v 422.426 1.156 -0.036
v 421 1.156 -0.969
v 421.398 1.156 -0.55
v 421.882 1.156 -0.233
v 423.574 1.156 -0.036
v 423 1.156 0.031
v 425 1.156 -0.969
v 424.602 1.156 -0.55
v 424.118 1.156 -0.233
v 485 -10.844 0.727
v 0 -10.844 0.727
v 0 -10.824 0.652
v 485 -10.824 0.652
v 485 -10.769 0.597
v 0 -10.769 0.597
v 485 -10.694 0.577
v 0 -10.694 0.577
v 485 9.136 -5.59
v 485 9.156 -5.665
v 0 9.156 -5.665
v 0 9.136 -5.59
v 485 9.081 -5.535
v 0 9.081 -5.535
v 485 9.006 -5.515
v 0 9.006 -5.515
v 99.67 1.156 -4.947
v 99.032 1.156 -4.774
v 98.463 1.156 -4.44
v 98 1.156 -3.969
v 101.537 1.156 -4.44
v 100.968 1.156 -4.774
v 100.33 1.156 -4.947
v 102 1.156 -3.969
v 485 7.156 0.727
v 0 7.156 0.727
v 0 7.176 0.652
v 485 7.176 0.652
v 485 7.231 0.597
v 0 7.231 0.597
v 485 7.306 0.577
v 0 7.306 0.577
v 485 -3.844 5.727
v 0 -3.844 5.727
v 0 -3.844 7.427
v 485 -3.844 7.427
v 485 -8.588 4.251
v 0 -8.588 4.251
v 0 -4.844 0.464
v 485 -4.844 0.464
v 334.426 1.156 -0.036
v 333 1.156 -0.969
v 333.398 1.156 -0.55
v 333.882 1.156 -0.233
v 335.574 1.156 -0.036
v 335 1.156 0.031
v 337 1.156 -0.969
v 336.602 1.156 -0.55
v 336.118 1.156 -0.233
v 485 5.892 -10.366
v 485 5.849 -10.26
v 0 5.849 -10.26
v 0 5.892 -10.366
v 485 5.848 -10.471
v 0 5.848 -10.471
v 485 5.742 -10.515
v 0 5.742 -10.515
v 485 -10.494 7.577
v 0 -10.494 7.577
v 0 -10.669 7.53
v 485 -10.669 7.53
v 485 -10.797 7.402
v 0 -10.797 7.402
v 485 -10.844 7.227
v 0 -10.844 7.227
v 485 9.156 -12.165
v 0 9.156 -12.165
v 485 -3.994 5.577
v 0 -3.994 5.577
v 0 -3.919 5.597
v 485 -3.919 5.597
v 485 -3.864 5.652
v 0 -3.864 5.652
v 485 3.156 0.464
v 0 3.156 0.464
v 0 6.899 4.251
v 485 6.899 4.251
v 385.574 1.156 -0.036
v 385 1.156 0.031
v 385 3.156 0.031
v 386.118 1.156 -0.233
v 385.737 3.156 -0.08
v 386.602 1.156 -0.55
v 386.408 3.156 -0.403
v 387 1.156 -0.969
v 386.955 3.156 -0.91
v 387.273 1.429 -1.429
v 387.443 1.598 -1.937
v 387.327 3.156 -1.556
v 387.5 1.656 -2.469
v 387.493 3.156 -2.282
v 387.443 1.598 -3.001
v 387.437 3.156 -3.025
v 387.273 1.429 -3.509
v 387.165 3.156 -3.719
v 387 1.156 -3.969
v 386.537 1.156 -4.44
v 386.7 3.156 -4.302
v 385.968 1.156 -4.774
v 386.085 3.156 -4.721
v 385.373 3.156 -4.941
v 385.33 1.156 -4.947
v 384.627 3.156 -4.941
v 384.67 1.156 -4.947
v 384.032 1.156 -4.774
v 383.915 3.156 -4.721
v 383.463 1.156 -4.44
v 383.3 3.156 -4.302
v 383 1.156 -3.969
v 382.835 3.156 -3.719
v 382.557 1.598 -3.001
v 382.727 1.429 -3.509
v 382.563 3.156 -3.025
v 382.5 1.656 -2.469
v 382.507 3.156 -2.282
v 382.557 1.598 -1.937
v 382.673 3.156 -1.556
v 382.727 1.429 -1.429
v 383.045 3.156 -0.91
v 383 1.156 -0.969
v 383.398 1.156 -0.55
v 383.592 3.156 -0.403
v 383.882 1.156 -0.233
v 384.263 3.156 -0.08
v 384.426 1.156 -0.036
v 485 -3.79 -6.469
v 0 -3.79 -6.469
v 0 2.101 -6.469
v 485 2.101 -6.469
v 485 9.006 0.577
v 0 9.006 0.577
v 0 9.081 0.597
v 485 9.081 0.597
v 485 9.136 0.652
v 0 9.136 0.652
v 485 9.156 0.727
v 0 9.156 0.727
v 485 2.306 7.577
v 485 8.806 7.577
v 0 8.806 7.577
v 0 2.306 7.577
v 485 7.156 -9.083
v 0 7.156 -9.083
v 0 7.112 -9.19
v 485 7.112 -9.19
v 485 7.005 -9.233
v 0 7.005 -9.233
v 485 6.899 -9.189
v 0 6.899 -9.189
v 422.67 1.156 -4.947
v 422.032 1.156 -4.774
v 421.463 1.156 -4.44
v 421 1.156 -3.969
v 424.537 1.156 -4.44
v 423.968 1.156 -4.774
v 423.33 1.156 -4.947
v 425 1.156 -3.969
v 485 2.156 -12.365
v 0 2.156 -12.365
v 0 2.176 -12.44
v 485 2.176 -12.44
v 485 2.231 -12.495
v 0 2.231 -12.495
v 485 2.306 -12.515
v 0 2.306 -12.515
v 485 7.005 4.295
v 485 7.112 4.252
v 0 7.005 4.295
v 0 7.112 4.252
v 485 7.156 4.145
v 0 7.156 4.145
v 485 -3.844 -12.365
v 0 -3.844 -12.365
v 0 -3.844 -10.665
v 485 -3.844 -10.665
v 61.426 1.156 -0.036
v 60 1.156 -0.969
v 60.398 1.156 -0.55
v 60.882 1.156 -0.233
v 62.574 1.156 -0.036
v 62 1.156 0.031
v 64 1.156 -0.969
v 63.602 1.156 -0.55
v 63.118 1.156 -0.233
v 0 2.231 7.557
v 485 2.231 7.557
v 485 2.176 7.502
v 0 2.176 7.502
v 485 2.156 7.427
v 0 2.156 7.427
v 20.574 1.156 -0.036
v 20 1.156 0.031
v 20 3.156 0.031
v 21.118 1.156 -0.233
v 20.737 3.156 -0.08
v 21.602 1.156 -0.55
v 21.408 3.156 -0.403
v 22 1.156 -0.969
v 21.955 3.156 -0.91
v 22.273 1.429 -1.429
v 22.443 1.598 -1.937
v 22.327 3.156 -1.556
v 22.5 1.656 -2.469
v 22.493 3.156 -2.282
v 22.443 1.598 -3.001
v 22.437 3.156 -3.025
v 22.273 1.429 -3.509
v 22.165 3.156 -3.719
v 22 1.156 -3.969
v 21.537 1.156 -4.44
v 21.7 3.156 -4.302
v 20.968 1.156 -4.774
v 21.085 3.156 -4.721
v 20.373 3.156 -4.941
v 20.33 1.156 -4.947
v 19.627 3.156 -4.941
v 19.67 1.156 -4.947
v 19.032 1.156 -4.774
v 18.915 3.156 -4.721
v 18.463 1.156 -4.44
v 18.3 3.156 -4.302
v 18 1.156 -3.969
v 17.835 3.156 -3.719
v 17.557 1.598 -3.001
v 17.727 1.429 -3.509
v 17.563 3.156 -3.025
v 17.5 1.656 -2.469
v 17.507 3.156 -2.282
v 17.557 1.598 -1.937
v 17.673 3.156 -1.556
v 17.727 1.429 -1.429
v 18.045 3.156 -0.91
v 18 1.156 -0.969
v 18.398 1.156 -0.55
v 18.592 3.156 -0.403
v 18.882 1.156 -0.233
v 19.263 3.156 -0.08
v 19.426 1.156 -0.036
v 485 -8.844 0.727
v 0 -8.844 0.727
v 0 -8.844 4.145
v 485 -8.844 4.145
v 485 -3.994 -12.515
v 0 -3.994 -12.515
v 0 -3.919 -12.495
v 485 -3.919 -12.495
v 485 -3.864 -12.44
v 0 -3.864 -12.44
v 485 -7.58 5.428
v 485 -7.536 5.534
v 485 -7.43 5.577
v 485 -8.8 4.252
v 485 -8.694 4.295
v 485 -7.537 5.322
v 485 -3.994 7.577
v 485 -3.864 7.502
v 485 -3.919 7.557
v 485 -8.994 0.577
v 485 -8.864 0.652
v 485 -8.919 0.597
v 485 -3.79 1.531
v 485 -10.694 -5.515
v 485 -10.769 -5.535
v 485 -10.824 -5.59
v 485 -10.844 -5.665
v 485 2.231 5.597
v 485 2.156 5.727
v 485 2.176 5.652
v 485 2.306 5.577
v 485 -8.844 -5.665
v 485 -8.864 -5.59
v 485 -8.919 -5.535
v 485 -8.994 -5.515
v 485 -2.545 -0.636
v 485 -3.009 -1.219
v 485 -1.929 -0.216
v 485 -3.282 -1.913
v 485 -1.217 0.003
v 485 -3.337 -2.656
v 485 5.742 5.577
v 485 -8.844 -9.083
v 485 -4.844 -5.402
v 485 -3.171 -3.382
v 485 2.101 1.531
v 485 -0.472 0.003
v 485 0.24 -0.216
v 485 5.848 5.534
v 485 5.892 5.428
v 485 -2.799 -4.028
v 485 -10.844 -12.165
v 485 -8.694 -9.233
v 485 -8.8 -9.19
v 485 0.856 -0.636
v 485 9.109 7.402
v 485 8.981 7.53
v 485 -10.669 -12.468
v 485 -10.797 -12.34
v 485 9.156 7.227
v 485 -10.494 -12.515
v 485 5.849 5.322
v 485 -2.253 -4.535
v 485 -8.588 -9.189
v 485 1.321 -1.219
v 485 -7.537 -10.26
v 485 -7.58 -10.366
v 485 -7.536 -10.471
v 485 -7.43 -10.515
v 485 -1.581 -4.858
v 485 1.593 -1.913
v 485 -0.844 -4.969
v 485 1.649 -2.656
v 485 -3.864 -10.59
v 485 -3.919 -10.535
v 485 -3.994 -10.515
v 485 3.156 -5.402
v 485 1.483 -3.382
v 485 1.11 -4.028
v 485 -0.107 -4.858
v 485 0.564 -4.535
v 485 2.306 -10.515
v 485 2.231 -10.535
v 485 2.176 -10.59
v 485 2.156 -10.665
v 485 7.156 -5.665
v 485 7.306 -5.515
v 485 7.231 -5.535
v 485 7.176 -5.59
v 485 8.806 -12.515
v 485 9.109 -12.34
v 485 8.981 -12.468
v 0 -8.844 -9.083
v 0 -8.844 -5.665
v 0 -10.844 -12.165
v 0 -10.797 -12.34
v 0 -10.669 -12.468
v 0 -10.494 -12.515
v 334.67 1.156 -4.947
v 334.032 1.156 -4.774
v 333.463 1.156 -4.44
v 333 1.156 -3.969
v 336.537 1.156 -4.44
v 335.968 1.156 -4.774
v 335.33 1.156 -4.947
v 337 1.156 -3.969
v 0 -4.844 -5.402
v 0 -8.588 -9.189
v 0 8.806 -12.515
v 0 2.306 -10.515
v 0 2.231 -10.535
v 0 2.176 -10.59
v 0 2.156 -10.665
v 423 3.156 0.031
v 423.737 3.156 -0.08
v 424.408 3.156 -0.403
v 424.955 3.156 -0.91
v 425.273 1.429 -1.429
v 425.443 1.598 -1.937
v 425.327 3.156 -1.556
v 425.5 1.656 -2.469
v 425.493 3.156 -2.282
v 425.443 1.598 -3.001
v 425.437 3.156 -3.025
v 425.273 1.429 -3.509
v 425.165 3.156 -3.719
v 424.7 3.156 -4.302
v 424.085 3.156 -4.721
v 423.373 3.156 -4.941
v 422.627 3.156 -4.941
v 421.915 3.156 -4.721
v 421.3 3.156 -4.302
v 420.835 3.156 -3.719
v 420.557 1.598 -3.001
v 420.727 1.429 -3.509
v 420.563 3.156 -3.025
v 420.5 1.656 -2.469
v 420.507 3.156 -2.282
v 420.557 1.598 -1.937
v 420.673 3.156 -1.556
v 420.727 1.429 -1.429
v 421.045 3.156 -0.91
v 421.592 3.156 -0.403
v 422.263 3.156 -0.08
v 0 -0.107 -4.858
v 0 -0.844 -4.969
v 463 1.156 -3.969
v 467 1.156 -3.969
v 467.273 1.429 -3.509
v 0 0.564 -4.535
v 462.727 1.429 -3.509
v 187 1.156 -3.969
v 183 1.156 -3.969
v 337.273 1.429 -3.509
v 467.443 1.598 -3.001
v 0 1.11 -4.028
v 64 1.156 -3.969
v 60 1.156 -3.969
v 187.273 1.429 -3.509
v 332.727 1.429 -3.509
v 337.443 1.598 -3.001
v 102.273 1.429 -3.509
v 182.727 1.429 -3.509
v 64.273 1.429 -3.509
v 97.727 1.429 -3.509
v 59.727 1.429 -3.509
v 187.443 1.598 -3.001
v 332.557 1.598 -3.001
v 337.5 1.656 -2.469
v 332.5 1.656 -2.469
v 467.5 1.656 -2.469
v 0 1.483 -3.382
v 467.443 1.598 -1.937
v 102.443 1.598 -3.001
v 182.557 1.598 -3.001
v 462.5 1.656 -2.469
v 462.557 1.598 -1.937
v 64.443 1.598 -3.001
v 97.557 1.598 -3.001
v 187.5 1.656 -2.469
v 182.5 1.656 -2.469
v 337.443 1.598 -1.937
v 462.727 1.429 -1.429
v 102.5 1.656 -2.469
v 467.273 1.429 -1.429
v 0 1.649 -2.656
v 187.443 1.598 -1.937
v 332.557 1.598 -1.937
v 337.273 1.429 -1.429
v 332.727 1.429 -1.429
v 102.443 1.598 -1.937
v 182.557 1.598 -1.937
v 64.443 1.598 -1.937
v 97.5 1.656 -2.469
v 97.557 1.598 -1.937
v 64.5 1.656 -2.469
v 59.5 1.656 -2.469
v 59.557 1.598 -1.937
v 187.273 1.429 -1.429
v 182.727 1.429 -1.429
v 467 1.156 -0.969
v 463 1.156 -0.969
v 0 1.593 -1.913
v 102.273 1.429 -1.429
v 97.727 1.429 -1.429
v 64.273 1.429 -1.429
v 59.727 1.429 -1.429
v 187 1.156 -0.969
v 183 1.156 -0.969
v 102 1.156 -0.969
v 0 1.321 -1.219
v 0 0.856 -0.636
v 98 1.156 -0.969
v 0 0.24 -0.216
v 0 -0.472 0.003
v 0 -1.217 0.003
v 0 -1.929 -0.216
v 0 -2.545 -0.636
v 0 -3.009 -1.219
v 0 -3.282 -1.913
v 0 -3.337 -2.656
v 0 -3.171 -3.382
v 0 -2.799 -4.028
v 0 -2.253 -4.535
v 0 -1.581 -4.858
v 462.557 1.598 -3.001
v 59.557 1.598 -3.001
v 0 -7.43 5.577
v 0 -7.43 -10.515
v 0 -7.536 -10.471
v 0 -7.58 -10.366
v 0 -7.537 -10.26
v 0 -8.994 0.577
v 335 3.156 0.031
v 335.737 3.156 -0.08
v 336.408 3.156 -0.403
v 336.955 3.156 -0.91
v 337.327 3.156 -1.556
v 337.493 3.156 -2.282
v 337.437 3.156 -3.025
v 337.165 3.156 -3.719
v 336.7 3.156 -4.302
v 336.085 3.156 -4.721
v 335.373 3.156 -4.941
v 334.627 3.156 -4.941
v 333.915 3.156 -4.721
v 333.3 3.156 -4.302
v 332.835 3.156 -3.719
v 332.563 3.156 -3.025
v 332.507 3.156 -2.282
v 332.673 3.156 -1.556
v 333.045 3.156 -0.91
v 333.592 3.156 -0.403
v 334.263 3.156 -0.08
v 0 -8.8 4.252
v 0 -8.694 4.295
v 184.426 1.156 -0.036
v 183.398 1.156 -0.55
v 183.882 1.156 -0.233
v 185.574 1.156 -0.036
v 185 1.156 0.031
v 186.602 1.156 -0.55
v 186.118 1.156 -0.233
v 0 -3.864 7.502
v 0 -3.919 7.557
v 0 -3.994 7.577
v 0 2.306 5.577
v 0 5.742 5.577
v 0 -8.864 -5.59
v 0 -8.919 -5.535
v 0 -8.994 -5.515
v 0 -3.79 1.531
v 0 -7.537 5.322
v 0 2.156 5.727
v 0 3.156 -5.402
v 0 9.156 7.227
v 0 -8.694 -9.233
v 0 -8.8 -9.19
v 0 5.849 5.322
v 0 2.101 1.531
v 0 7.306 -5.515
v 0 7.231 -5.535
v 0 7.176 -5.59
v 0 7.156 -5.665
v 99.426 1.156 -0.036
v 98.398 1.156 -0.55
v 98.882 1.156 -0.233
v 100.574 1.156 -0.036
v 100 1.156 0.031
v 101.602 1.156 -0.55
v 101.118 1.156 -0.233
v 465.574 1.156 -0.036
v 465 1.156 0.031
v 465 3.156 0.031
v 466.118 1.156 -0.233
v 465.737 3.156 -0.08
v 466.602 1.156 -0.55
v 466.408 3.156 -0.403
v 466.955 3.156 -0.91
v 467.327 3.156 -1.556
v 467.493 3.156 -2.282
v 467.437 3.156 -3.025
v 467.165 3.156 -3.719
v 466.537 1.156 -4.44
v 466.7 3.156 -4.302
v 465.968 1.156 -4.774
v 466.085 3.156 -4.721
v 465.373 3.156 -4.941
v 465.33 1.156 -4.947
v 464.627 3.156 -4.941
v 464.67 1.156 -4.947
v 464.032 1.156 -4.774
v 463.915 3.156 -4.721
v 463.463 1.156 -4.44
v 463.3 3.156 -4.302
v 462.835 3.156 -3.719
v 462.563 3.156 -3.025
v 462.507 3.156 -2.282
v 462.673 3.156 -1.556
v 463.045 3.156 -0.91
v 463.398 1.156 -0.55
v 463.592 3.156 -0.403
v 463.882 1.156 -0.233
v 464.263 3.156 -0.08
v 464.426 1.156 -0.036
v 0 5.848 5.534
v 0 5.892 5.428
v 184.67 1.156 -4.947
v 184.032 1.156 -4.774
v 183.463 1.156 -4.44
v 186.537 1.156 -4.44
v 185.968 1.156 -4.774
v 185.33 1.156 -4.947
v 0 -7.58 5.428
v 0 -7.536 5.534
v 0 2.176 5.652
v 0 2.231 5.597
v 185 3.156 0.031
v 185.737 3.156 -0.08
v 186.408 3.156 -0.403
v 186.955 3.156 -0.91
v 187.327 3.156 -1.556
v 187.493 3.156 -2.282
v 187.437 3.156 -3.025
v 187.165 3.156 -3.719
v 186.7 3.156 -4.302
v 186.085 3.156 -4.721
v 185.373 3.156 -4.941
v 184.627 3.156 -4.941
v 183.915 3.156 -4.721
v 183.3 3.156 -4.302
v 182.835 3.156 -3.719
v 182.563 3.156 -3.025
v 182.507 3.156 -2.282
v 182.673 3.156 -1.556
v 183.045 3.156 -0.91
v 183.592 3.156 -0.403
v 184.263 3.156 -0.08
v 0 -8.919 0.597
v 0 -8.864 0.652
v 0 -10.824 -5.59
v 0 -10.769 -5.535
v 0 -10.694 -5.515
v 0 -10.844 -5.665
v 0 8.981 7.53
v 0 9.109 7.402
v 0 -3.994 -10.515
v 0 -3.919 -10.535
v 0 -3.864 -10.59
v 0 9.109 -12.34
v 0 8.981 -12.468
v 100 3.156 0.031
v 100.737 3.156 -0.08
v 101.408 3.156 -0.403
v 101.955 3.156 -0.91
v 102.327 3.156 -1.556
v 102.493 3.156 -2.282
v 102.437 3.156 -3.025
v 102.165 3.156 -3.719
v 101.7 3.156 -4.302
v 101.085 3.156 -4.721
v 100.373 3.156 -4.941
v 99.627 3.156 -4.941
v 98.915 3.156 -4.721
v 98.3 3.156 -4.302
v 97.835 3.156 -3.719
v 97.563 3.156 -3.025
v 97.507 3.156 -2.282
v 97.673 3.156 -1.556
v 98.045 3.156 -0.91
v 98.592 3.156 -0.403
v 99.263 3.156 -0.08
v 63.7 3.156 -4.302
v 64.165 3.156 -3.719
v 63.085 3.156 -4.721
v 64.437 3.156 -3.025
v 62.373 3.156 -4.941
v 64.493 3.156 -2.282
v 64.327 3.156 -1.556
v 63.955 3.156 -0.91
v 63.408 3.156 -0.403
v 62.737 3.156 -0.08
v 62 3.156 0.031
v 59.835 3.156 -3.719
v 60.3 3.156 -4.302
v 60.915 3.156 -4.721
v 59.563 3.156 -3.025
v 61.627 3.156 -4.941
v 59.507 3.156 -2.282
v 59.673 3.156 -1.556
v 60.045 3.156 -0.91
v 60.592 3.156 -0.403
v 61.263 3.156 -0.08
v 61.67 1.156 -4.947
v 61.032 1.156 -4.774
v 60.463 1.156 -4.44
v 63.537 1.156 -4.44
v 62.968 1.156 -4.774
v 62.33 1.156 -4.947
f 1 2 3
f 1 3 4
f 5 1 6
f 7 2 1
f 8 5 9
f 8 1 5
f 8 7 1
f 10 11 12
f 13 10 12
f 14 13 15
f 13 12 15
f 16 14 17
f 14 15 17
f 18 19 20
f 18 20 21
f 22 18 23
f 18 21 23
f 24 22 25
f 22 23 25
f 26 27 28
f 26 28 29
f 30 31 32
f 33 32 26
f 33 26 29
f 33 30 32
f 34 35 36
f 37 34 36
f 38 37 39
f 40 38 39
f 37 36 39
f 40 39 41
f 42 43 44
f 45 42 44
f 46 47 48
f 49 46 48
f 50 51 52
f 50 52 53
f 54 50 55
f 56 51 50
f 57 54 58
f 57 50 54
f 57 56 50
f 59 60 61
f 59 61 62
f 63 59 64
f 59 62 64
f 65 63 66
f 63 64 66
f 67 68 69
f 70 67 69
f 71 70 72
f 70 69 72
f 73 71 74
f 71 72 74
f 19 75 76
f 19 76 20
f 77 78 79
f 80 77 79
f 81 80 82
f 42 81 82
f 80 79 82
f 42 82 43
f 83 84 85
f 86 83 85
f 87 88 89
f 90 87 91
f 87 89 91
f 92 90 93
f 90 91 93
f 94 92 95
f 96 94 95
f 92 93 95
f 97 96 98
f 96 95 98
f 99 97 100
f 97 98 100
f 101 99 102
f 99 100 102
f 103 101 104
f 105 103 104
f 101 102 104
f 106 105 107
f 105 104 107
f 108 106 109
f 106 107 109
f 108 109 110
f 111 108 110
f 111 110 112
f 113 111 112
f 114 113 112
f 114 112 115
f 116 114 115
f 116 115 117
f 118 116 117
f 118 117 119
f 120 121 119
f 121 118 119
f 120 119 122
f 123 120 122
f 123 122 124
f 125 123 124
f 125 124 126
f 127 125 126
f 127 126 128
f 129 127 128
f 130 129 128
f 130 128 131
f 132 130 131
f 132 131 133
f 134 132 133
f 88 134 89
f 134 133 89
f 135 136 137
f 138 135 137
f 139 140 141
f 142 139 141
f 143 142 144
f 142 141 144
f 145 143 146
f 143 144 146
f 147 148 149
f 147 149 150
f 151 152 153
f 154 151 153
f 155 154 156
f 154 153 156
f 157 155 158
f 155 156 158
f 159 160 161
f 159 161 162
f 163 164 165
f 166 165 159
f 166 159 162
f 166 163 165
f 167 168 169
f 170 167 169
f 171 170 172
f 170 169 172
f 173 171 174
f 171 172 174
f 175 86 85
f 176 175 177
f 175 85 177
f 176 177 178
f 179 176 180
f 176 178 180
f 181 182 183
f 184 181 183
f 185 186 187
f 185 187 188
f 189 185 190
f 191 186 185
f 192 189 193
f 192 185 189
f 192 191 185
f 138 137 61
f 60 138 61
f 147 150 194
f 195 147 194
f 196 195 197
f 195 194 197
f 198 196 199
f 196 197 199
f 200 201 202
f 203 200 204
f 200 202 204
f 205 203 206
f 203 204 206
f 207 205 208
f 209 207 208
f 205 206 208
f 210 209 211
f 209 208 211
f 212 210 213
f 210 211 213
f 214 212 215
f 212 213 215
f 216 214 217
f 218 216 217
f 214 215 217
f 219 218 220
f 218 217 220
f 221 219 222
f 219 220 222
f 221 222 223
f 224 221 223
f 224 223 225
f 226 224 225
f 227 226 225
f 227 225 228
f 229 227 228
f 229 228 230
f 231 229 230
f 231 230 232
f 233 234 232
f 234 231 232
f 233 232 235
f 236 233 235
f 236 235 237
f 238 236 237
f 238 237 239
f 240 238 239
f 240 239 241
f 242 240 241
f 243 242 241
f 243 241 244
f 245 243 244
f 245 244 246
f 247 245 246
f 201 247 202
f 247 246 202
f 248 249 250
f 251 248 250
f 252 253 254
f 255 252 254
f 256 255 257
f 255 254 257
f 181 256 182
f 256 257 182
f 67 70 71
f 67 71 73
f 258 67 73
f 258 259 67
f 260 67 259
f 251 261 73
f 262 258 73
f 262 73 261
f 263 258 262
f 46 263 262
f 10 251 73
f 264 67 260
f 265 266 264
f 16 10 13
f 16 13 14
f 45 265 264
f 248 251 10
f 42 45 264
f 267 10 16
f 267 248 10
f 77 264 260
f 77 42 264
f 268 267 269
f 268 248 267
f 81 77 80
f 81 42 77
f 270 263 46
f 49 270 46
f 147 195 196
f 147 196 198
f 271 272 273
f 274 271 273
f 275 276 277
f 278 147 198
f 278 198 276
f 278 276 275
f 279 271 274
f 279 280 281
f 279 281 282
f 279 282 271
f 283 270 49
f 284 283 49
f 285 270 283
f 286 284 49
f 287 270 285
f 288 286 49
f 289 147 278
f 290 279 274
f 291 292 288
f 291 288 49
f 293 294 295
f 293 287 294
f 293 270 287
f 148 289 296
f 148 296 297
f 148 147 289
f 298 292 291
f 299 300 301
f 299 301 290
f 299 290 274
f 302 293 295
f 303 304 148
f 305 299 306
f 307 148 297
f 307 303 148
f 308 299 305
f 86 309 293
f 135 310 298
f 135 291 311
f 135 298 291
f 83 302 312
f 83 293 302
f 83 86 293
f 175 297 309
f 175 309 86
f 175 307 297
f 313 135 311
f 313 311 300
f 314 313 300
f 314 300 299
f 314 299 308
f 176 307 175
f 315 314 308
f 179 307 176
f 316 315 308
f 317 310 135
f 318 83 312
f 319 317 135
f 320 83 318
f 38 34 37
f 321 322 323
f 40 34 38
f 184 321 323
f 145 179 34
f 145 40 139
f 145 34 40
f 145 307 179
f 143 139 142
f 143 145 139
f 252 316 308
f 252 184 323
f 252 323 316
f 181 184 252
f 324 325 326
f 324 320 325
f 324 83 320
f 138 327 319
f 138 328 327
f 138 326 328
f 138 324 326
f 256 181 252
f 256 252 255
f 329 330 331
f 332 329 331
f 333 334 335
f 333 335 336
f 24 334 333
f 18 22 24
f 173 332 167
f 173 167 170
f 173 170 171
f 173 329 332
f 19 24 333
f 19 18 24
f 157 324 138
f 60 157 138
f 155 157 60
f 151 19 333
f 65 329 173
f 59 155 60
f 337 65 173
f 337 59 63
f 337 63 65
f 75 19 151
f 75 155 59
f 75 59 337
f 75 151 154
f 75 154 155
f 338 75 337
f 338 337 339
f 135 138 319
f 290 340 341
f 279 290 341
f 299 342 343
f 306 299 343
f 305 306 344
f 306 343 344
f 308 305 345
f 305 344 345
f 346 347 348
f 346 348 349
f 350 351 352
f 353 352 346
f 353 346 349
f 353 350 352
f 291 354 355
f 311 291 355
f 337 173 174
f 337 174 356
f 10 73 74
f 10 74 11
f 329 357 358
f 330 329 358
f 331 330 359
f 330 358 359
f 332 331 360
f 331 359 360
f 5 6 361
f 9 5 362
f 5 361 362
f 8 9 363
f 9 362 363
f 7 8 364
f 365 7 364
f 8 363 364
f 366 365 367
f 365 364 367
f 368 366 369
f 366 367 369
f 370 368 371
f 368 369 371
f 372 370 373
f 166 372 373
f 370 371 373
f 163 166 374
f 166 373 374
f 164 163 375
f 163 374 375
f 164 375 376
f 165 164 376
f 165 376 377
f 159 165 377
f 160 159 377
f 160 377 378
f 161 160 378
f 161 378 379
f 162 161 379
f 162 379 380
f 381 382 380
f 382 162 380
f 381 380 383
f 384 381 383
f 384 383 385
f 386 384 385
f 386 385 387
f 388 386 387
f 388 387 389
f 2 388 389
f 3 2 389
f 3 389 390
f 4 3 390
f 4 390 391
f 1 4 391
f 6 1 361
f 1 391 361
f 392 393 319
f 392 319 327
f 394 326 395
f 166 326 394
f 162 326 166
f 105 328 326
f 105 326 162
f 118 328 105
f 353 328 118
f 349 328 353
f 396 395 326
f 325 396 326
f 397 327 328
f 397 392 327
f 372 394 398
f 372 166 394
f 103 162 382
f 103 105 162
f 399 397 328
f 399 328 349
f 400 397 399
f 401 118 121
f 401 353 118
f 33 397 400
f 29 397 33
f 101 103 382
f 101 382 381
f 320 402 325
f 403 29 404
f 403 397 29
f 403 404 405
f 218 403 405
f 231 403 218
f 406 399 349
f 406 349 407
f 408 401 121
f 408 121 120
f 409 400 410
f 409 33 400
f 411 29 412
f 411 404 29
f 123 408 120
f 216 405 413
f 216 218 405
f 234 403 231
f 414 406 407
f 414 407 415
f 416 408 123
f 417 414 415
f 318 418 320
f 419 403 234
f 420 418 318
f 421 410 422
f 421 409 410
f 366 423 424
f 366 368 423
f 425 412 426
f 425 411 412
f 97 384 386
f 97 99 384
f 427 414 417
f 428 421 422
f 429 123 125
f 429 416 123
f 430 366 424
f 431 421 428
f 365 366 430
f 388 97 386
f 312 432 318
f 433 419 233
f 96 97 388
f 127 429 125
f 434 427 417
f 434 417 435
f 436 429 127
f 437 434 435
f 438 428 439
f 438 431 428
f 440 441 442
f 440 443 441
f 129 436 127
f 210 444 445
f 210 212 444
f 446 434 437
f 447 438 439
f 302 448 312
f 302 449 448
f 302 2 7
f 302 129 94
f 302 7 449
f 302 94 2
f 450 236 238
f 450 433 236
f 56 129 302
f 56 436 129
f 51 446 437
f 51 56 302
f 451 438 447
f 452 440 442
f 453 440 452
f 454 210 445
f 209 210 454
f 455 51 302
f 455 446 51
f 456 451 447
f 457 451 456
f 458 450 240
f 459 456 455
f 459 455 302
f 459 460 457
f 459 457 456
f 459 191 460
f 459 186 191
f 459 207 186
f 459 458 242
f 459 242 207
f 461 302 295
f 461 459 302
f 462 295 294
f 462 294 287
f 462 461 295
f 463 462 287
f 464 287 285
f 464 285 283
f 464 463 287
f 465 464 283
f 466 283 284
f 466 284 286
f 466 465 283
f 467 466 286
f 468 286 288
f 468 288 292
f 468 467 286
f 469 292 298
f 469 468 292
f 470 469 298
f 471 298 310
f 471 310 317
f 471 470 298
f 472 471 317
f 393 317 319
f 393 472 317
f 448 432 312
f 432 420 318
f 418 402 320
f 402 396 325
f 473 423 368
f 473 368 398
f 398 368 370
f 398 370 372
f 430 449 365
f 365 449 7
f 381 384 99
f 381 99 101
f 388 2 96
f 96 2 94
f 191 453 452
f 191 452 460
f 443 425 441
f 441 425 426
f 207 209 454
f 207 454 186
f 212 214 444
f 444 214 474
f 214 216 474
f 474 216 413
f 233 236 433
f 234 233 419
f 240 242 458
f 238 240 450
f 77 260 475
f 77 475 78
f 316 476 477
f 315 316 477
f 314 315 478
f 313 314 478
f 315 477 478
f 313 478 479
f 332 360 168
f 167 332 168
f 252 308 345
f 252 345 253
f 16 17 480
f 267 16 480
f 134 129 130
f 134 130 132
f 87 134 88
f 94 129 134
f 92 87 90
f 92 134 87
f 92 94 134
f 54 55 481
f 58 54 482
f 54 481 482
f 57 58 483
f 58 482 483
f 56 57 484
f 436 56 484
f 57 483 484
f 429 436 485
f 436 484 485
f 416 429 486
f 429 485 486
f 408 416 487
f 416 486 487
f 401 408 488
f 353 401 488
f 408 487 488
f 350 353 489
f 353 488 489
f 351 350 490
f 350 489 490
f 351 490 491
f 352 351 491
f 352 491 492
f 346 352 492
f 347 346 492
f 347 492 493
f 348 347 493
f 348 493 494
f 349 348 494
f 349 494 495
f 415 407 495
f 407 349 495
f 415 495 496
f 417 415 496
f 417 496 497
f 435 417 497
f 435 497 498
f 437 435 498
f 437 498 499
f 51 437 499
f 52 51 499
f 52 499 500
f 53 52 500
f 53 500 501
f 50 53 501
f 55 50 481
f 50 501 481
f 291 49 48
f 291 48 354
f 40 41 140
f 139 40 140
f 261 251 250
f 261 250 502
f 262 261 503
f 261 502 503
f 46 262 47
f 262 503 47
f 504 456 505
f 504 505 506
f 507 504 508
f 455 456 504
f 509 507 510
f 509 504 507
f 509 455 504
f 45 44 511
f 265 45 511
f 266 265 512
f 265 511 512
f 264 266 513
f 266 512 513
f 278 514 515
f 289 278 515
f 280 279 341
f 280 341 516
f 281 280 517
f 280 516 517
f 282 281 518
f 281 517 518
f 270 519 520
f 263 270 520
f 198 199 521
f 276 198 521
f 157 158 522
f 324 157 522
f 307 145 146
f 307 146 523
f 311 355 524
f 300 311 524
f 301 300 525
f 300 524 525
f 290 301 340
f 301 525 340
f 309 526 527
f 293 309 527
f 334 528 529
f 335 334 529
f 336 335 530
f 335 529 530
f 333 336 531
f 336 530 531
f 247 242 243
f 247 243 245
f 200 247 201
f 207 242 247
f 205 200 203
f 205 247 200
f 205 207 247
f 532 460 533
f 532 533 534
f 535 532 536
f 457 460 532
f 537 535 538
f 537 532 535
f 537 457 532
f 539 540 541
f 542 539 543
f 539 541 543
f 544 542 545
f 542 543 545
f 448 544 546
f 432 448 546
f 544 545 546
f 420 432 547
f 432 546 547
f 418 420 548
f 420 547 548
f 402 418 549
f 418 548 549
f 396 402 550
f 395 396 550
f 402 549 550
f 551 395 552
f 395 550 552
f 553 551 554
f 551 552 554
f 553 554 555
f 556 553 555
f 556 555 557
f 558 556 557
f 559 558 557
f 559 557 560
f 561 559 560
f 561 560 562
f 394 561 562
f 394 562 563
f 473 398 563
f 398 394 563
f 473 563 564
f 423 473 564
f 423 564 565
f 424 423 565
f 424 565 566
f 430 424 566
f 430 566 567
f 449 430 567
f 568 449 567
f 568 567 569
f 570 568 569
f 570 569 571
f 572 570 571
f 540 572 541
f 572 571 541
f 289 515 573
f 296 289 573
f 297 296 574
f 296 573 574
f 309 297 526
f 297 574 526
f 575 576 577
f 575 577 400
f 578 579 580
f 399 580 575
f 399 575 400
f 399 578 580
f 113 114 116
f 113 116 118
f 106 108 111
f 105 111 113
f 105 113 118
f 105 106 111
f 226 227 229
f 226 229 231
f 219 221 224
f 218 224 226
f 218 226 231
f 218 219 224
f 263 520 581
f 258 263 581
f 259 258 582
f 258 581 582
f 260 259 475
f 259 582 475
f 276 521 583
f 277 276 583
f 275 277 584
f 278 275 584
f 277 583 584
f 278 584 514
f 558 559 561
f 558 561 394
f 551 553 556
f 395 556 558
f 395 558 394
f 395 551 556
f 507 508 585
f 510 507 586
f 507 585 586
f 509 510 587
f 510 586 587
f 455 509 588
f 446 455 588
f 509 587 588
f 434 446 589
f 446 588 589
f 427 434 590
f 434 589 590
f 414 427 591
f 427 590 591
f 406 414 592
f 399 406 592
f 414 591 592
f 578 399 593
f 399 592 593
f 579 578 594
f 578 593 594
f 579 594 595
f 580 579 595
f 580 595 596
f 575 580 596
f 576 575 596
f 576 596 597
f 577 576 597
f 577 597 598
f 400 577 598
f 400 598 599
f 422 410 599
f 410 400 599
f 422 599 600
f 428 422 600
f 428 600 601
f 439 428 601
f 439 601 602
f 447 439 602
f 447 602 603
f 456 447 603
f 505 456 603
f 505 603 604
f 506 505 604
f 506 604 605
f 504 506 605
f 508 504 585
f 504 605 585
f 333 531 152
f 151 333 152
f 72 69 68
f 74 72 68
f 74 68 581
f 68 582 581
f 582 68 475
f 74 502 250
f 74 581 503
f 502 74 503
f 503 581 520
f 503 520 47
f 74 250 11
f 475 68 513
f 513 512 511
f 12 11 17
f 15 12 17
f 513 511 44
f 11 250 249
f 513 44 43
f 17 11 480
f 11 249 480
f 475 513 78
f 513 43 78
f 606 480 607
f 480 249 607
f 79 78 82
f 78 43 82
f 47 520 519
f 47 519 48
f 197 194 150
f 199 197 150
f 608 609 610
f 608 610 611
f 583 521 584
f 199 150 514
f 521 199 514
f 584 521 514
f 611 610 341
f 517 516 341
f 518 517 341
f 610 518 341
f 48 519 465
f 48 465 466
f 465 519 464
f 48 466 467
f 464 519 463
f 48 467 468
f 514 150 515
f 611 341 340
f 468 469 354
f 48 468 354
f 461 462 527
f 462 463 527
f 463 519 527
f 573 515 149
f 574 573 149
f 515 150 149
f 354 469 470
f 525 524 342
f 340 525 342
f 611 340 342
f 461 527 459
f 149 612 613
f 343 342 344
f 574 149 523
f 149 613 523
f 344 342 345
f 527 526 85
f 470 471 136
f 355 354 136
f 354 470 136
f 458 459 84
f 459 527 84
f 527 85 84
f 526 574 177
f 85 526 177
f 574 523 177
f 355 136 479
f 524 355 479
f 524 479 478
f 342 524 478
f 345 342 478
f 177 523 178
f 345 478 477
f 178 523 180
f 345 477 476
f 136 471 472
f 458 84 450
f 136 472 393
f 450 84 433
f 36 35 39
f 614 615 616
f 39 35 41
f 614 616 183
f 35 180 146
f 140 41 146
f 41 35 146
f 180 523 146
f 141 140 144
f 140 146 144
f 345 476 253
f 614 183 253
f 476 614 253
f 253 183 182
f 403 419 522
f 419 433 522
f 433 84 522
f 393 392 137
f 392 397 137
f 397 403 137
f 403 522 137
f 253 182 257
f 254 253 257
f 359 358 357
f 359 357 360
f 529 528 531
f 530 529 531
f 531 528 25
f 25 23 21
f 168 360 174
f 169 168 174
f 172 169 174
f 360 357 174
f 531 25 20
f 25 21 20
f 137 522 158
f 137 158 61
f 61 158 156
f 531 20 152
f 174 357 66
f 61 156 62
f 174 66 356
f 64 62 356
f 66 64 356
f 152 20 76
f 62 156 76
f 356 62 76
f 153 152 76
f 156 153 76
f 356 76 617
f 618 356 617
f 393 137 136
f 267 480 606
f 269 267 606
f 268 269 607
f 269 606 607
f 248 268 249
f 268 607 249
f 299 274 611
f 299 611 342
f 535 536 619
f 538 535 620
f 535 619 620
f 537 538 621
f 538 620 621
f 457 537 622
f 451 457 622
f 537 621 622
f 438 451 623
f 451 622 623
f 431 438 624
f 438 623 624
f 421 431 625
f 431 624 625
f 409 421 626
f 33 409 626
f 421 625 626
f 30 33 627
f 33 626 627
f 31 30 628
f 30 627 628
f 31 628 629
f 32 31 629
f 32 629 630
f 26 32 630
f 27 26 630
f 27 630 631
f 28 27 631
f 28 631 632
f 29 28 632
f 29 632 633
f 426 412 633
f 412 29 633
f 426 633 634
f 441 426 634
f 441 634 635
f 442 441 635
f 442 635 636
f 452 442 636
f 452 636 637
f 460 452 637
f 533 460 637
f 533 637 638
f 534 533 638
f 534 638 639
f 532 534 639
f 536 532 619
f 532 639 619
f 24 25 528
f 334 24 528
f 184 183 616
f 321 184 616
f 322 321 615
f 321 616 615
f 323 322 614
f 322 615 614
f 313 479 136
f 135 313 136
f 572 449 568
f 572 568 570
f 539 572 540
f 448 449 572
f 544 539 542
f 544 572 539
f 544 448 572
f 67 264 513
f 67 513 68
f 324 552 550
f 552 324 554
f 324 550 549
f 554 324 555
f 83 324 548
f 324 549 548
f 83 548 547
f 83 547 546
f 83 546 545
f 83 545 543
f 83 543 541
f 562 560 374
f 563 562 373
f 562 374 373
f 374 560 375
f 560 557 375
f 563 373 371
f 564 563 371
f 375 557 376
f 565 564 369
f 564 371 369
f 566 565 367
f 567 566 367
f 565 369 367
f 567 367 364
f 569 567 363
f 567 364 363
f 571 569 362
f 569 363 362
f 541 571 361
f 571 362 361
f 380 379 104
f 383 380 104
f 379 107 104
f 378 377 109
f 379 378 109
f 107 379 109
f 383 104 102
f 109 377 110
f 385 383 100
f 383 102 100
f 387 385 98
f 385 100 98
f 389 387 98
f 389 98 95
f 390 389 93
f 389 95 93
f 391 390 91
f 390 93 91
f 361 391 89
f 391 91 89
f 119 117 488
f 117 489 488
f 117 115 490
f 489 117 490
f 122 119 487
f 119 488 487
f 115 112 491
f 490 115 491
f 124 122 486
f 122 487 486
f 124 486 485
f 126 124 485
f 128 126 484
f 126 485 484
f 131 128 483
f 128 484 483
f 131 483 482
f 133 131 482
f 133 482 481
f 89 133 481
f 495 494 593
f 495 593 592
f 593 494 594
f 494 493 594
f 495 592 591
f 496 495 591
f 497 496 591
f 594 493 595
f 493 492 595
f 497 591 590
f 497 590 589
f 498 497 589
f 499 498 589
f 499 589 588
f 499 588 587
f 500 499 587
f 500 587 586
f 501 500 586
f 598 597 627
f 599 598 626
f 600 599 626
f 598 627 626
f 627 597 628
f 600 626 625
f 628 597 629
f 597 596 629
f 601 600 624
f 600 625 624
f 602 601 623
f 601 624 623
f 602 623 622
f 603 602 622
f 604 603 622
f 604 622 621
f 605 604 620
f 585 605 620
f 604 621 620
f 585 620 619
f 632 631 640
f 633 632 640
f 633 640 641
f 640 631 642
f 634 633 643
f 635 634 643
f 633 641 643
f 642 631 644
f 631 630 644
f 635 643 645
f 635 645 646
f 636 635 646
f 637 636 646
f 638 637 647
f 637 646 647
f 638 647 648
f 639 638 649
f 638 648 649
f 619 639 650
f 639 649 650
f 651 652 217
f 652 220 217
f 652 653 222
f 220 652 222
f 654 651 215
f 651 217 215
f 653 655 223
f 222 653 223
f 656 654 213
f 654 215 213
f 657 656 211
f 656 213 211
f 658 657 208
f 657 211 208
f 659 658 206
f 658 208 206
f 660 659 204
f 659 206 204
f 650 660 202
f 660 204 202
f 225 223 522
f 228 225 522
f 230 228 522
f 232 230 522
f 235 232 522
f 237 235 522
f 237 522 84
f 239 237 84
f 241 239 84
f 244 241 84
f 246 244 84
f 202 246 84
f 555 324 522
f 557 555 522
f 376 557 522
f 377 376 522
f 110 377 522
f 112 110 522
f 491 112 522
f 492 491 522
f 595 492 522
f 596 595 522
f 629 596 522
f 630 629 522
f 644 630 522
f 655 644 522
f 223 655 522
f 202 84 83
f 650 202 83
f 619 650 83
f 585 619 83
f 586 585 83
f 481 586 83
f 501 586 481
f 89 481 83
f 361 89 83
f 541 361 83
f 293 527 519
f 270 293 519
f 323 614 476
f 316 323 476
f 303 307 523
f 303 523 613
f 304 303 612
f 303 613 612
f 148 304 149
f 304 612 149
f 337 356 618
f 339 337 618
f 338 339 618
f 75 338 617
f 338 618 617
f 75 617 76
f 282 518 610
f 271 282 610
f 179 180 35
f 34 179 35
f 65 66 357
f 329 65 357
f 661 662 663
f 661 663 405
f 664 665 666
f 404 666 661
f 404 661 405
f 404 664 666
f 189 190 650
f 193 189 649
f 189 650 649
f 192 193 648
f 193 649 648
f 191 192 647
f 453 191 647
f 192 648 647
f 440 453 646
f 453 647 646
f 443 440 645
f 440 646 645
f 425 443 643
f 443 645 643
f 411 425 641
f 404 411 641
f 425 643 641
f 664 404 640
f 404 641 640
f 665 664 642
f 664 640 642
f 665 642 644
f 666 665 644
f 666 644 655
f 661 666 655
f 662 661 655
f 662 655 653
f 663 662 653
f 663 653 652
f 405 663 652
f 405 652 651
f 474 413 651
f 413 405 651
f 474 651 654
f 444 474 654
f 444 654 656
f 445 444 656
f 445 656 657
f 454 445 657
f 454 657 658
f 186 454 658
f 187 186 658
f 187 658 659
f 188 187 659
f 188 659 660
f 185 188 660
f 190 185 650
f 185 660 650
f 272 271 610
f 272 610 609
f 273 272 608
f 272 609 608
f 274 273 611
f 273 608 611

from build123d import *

# Parameters (mm, degrees)
SKETCH1_R           = 2.5
BOSS_EXTRUDE1_DEPTH = 485
SKETCH2_R           = 2.5
CUT_EXTRUDE1_DEPTH  = 2


with BuildPart() as part:
    # Sketch1 → Boss-Extrude1 (new body)
    with BuildSketch(Plane(origin=(0, 0, 0), x_dir=(0, 0, -1), z_dir=(1, 0, 0))):
        with BuildLine():
            Line((-7.427382464, 2.155691805), (-5.727382464, 2.155691805))
            ThreePointArc((-5.727382464, 2.155691805), (-5.621316447, 2.199625788), (-5.577382464, 2.305691805))
            Line((-5.577382464, 2.305691805), (-5.577382464, 5.741876319))
            ThreePointArc((-5.577382464, 5.741876319), (-5.485183419, 5.880292537), (-5.321928469, 5.848550846))
            Line((-5.321928469, 5.848550846), (-1.531086168, 2.101082027))
            Line((-1.531086168, 2.101082027), (-1.531086168, -3.789698417))
            Line((-1.531086168, -3.789698417), (-5.321928469, -7.537167236))
            ThreePointArc((-5.321928469, -7.537167236), (-5.485183419, -7.568908927), (-5.577382464, -7.430492708))
            Line((-5.577382464, -7.430492708), (-5.577382464, -3.994308195))
            ThreePointArc((-5.577382464, -3.994308195), (-5.621316447, -3.888242178), (-5.727382464, -3.844308195))
            Line((-5.727382464, -3.844308195), (-7.427382464, -3.844308195))
            ThreePointArc((-7.427382464, -3.844308195), (-7.533448481, -3.888242178), (-7.577382464, -3.994308195))
            Line((-7.577382464, -3.994308195), (-7.577382464, -10.494308195))
            ThreePointArc((-7.577382464, -10.494308195), (-7.474869837, -10.741795568), (-7.227382464, -10.844308195))
            Line((-7.227382464, -10.844308195), (-0.727382464, -10.844308195))
            ThreePointArc((-0.727382464, -10.844308195), (-0.621316447, -10.800374212), (-0.577382464, -10.694308195))
            Line((-0.577382464, -10.694308195), (-0.577382464, -8.994308195))
            ThreePointArc((-0.577382464, -8.994308195), (-0.621316447, -8.888242178), (-0.727382464, -8.844308195))
            Line((-0.727382464, -8.844308195), (-4.145467261, -8.844308195))
            ThreePointArc((-4.145467261, -8.844308195), (-4.284213755, -8.751311795), (-4.250921257, -8.587633667))
            Line((-4.250921257, -8.587633667), (-0.464270258, -4.844308195))
            Line((-0.464270258, -4.844308195), (5.402097922, -4.844308195))
            Line((5.402097922, -4.844308195), (9.188748921, -8.587633667))
            ThreePointArc((9.188748921, -8.587633667), (9.22204142, -8.751311795), (9.083294926, -8.844308195))
            Line((9.083294926, -8.844308195), (5.665210129, -8.844308195))
            ThreePointArc((5.665210129, -8.844308195), (5.559144111, -8.888242178), (5.515210129, -8.994308195))
            Line((5.515210129, -8.994308195), (5.515210129, -10.694308195))
            ThreePointArc((5.515210129, -10.694308195), (5.559144111, -10.800374212), (5.665210129, -10.844308195))
            Line((5.665210129, -10.844308195), (12.165210129, -10.844308195))
            ThreePointArc((12.165210129, -10.844308195), (12.412697502, -10.741795568), (12.515210129, -10.494308195))
            Line((12.515210129, -10.494308195), (12.515210129, -3.994308195))
            ThreePointArc((12.515210129, -3.994308195), (12.471276146, -3.888242178), (12.365210129, -3.844308195))
            Line((12.365210129, -3.844308195), (10.665210129, -3.844308195))
            ThreePointArc((10.665210129, -3.844308195), (10.559144111, -3.888242178), (10.515210129, -3.994308195))
            Line((10.515210129, -3.994308195), (10.515210129, -7.430492708))
            ThreePointArc((10.515210129, -7.430492708), (10.423011083, -7.568908927), (10.259756133, -7.537167236))
            Line((10.259756133, -7.537167236), (6.468913832, -3.789698417))
            Line((6.468913832, -3.789698417), (6.468913832, 2.101082027))
            Line((6.468913832, 2.101082027), (10.259756133, 5.848550846))
            ThreePointArc((10.259756133, 5.848550846), (10.423011083, 5.880292537), (10.515210129, 5.741876319))
            Line((10.515210129, 5.741876319), (10.515210129, 2.305691805))
            ThreePointArc((10.515210129, 2.305691805), (10.559144111, 2.199625788), (10.665210129, 2.155691805))
            Line((10.665210129, 2.155691805), (12.365210129, 2.155691805))
            ThreePointArc((12.365210129, 2.155691805), (12.471276146, 2.199625788), (12.515210129, 2.305691805))
            Line((12.515210129, 2.305691805), (12.515210129, 8.805691805))
            ThreePointArc((12.515210129, 8.805691805), (12.412697502, 9.053179179), (12.165210129, 9.155691805))
            Line((12.165210129, 9.155691805), (5.665210129, 9.155691805))
            ThreePointArc((5.665210129, 9.155691805), (5.559144111, 9.111757822), (5.515210129, 9.005691805))
            Line((5.515210129, 9.005691805), (5.515210129, 7.305691805))
            ThreePointArc((5.515210129, 7.305691805), (5.559144111, 7.199625788), (5.665210129, 7.155691805))
            Line((5.665210129, 7.155691805), (9.083294926, 7.155691805))
            ThreePointArc((9.083294926, 7.155691805), (9.22204142, 7.062695405), (9.188748921, 6.899017277))
            Line((9.188748921, 6.899017277), (5.402097922, 3.155691805))
            Line((5.402097922, 3.155691805), (-0.464270258, 3.155691805))
            Line((-0.464270258, 3.155691805), (-4.250921257, 6.899017277))
            ThreePointArc((-4.250921257, 6.899017277), (-4.284213755, 7.062695405), (-4.145467261, 7.155691805))
            Line((-4.145467261, 7.155691805), (-0.727382464, 7.155691805))
            ThreePointArc((-0.727382464, 7.155691805), (-0.621316447, 7.199625788), (-0.577382464, 7.305691805))
            Line((-0.577382464, 7.305691805), (-0.577382464, 9.005691805))
            ThreePointArc((-0.577382464, 9.005691805), (-0.621316447, 9.111757822), (-0.727382464, 9.155691805))
            Line((-0.727382464, 9.155691805), (-7.227382464, 9.155691805))
            ThreePointArc((-7.227382464, 9.155691805), (-7.474869837, 9.053179179), (-7.577382464, 8.805691805))
            Line((-7.577382464, 8.805691805), (-7.577382464, 2.305691805))
            ThreePointArc((-7.577382464, 2.305691805), (-7.533448481, 2.199625788), (-7.427382464, 2.155691805))
        make_face()
        with Locations((2.468913832, -0.844308195)):
            Circle(SKETCH1_R, mode=Mode.SUBTRACT)
    extrude(amount=BOSS_EXTRUDE1_DEPTH)

    # Sketch2 → Cut-Extrude1 (cut)
    with BuildSketch(Plane(origin=(0, 3.155691805, 0), x_dir=(1, 0, 0), z_dir=(0, 1, 0))):
        with Locations(Location((20, 2.468913832, 0), (0, 0, 270))):
            Circle(SKETCH2_R)
        with Locations(Location((185, 2.468913832, 0), (0, 0, 270))):
            Circle(SKETCH2_R)
        with Locations(Location((465, 2.468913832, 0), (0, 0, 270))):
            Circle(SKETCH2_R)
        with Locations(Location((62, 2.468913832, 0), (0, 0, 270))):
            Circle(SKETCH2_R)
        with Locations(Location((423, 2.468913832, 0), (0, 0, 270))):
            Circle(SKETCH2_R)
        with Locations(Location((335, 2.468913832, 0), (0, 0, 270))):
            Circle(SKETCH2_R)
        with Locations(Location((385, 2.468913832, 0), (0, 0, 270))):
            Circle(SKETCH2_R)
        with Locations(Location((100, 2.468913832, 0), (0, 0, 270))):
            Circle(SKETCH2_R)
    extrude(amount=-CUT_EXTRUDE1_DEPTH, mode=Mode.SUBTRACT)


solid = part.part
